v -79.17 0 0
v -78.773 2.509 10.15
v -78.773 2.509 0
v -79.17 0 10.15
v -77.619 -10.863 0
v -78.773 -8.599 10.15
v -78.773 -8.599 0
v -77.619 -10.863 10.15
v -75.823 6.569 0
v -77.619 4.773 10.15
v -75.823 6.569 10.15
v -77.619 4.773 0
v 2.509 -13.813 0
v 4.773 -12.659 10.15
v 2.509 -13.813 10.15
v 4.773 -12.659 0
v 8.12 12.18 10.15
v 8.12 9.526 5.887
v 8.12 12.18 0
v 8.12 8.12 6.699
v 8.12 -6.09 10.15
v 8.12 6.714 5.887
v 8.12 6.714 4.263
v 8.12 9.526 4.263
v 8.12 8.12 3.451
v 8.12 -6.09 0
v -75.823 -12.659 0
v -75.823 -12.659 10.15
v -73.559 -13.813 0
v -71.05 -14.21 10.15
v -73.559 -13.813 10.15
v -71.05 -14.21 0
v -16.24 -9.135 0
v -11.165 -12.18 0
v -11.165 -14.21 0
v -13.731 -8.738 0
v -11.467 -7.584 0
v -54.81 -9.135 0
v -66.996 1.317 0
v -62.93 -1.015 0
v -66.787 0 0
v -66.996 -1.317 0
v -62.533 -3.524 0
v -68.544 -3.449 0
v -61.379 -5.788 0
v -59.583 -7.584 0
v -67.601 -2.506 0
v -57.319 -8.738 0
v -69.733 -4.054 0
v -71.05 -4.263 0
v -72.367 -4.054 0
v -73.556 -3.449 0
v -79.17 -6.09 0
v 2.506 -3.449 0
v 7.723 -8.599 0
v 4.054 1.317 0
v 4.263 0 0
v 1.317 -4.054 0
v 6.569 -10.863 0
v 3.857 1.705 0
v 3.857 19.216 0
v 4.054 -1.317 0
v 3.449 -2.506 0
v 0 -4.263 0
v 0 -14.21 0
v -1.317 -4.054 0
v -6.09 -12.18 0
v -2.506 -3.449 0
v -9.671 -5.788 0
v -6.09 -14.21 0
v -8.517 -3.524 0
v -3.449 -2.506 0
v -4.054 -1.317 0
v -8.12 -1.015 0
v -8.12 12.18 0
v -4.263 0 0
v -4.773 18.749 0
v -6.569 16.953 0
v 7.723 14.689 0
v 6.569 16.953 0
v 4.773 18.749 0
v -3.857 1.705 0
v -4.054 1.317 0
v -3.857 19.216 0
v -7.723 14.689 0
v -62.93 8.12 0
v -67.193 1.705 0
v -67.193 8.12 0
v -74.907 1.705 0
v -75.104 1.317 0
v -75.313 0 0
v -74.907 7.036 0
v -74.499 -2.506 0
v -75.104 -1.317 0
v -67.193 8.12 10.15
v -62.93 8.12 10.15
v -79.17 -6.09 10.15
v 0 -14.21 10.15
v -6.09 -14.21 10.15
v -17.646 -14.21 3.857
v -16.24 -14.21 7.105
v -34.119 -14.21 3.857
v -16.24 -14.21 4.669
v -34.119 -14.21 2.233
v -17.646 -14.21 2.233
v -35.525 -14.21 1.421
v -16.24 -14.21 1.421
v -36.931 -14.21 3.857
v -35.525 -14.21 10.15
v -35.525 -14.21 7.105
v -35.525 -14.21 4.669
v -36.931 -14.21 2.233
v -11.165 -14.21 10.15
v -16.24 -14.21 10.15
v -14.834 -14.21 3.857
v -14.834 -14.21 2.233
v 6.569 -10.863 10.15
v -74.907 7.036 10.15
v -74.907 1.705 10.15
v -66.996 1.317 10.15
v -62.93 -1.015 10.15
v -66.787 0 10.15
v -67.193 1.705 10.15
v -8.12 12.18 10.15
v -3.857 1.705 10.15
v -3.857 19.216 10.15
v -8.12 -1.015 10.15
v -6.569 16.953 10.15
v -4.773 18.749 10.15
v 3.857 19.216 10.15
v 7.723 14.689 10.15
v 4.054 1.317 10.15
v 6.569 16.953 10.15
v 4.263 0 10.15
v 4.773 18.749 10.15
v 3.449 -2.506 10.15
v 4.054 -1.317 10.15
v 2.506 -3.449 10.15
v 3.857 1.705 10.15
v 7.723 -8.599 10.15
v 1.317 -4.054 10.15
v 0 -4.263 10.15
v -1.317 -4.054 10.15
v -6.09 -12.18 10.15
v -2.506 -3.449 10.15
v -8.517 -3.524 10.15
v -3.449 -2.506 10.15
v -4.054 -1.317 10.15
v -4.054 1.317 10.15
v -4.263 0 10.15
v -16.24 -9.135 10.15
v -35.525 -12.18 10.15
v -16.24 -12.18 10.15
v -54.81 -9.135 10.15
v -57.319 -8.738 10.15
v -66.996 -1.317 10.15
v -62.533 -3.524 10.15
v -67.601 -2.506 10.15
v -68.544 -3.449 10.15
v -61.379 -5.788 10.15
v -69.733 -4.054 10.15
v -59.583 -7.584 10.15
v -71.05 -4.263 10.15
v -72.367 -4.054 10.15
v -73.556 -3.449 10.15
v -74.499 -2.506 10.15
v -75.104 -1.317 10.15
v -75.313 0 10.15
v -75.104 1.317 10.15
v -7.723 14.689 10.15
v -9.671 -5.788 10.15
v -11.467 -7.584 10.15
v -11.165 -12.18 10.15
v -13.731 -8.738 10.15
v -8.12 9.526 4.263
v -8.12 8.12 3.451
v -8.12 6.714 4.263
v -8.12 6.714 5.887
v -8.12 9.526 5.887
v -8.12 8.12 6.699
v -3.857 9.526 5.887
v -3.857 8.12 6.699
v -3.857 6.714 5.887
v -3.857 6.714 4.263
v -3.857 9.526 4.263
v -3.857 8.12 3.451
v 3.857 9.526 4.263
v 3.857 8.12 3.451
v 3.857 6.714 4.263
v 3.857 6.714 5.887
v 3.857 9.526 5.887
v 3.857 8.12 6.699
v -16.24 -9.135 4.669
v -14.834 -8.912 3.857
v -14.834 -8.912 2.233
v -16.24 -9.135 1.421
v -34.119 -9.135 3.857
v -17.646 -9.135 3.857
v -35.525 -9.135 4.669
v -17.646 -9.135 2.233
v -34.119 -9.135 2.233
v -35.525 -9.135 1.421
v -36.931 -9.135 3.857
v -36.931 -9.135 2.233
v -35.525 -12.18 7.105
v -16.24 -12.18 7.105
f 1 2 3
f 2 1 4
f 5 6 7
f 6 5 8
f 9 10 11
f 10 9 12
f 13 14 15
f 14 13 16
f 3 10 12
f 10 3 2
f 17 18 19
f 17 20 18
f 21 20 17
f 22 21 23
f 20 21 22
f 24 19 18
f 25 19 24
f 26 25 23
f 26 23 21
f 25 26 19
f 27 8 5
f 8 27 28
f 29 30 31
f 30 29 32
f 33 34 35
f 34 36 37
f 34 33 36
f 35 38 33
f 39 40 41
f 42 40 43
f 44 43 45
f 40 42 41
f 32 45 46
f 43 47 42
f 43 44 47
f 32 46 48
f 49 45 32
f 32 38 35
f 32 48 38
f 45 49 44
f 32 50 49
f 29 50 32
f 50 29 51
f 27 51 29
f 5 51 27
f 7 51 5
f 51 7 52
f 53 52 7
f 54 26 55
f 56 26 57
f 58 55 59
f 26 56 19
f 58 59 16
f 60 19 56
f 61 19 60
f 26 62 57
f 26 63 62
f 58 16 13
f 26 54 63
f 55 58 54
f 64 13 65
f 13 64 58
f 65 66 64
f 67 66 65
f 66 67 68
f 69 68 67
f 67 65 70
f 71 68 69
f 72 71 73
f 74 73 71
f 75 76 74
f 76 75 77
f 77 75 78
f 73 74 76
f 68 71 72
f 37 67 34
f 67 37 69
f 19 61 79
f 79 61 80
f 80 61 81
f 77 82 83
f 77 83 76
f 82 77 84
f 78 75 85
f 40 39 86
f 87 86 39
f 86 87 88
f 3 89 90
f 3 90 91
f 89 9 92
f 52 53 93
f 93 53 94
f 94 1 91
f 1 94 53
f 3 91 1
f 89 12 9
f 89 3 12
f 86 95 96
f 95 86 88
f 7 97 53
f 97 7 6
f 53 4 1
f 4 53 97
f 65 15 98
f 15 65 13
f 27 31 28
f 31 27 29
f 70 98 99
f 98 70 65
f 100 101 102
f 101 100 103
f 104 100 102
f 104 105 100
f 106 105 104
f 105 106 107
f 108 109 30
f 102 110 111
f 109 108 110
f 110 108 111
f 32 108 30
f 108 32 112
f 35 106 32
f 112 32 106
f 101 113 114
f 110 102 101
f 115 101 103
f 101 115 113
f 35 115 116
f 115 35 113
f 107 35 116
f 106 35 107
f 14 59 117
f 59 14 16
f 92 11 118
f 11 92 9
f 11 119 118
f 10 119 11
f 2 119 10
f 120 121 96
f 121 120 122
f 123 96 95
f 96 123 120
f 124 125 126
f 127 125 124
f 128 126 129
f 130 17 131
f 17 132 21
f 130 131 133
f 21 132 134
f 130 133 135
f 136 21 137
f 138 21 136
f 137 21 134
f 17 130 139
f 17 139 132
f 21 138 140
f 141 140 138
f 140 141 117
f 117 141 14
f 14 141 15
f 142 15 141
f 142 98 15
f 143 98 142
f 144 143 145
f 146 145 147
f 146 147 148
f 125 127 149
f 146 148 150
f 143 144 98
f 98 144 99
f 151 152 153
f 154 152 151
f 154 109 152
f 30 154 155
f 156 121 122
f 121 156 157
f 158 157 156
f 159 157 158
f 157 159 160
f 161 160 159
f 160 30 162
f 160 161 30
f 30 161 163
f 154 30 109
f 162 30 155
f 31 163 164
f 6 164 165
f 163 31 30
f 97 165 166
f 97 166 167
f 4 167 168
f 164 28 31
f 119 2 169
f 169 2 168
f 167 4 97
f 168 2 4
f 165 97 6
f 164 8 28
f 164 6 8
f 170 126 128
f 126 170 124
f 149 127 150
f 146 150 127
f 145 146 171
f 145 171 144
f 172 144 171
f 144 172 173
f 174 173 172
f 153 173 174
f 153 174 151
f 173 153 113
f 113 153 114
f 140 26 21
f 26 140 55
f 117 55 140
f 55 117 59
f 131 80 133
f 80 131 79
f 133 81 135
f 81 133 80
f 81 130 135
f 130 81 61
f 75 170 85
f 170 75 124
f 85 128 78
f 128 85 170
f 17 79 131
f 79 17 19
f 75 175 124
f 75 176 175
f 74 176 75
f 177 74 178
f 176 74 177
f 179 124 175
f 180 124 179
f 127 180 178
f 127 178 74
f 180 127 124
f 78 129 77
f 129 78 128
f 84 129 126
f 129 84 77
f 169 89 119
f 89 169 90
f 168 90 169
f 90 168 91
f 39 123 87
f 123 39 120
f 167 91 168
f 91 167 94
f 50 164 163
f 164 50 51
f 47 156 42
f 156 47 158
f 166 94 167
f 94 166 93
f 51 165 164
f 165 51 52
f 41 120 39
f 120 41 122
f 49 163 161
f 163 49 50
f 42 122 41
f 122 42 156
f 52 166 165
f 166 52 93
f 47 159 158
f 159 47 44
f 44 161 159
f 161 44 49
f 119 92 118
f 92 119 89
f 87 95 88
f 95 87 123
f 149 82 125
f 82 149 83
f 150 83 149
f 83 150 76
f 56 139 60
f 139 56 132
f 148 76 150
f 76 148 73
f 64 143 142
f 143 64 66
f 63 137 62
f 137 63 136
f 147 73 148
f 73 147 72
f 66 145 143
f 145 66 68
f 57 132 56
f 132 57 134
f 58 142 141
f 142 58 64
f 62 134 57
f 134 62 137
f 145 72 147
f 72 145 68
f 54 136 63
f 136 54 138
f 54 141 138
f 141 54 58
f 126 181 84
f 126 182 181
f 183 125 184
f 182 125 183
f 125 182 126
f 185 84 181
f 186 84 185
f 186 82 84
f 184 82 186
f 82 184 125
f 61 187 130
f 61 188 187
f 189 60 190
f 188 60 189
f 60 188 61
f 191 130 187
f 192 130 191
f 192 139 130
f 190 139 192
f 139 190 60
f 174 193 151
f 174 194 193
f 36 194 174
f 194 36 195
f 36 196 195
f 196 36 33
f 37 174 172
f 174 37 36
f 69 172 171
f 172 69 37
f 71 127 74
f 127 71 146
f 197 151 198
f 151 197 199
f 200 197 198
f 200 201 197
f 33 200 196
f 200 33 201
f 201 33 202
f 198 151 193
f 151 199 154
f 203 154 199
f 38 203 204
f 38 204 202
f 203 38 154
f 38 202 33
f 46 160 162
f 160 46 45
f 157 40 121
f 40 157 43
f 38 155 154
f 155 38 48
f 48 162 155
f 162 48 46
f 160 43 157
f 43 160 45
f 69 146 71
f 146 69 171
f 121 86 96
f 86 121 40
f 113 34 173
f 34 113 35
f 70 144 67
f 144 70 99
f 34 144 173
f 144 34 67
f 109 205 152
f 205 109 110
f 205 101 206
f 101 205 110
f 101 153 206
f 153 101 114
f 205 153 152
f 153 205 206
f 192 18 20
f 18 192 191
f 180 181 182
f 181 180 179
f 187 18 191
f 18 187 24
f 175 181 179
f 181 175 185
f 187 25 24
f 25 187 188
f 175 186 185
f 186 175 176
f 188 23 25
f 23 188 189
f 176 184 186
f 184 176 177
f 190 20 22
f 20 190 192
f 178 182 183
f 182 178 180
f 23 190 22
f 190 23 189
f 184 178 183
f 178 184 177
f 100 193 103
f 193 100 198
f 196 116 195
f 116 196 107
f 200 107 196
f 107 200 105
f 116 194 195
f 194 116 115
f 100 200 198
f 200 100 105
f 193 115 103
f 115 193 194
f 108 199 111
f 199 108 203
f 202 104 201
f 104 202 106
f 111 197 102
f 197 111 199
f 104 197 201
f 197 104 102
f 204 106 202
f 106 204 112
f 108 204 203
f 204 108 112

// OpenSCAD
// file: endstops.scad
include <configuration.scad>

rod_spacing = x_rod_spacing;

//! x_endstop_bumper();

scale([1.015, 1.015, 1.015]){
	rotate([0,180,0]){
		translate([0,0,-10]){
			x_endstop(1);
		}
	}
}

module x_endstop_bumper(){
	rotate([90,0,0])
		linear_extrude(height=20)
			polygon( points=[[0,0],[12,0],[12,12]]);

}



module x_endstop(for_x_axis=0){

	union(){
	
		difference(){
	
			union(){
				
				hull(){
	
					cylinder(r=8, h=10, $fn=20);
					translate([rod_spacing, 0, 0])
						cylinder(r=8, h=10, $fn=20);
	
					translate([0, -6, 0]){
					cylinder(r=8, h=10, $fn=20);
					translate([rod_spacing, 0, 0])
						cylinder(r=8, h=10, $fn=20);
					}
				}
	
				hull(){
	
					cylinder(r=8, h=10, $fn=20);
					translate([0, 12, 0])
						cylinder(r=8, h=10, $fn=20);
	
				}
		
	
			}
	
			union(){
	
				translate([0,0,-1]){
	
					#cylinder(r=4.2, h=12, $fn=20);
					translate([-3.8,0,0])
						#cube([7.6,20,12]);
	
					translate([rod_spacing, 0, 0]){
						#cylinder(r=4.2, h=12, $fn=20);
						translate([-3.8,0,0])
							#cube([7.6,20,12]);
	
					}
	
					translate([16, -1, 0]){
						hull(){
	
							#cylinder(r=8, h=12, $fn=20);
							translate([rod_spacing - 32, 0, 0])
								#cylinder(r=8, h=12, $fn=20);
	
							translate([0, 16, 0]){
								#cylinder(r=8, h=12, $fn=20);
								translate([rod_spacing - 32, 0, 0])
									#cylinder(r=8, h=12, $fn=20);
							}
						}
	
					}
	
					translate([6, -15, 0]){
						#cube([5,3,12]);
					}
	
					translate([16, -15, 0]){
						#cube([19,3,4]);
					}
					
					if(!for_x_axis){
		
						translate([46, -15, 0]){
							#cube([40,40,13]);		
						}	
					}
	
				}
				
				translate([-10, 8, 5])
				rotate([0,90,0])
				#cylinder(r=1.6, h=20);
	
				translate([16, -4, 7])
				rotate([90,90,0])
				#cylinder(r=1.6, h=20);
	
				translate([35, -4, 7])   // 19mm spacing for pcb holes
				rotate([90,90,0])
				#cylinder(r=1.6, h=20);
	
				
	
	
	
			}
	
		}  // end diff
	
		if(!for_x_axis){
				translate([46, -10, 0])
				cylinder(r=4, h=10, $fn=20);
		}

	}    // end outer union

}
// file: configuration.scad
rod_radius = 6.0;
frame_rod_radius = 4.0;
z_threaded_rod_radius = 4.0;

y_rod_height = 70;
x_rod_spacing = 70;

bearing_radius = 11; 					// 608 bearing

//  LM8 = 7.5  LM10 = 9.5  LM12 = 10.5
linear_bearing_radius =  7.6;  // LM8 + some extra space

z_threaded_to_smooth_spacing = 30;   // 30mm is OK for 8mm rods 
x_end_threaded_rod_height = 20;
// main file
include <configuration.scad>
use <endstops.scad>

scale([1.015, 1.015, 1.015]){
	rotate([0,180,0]){
		translate([0,0,-10]){
			x_endstop(1);
		}
	}
}
